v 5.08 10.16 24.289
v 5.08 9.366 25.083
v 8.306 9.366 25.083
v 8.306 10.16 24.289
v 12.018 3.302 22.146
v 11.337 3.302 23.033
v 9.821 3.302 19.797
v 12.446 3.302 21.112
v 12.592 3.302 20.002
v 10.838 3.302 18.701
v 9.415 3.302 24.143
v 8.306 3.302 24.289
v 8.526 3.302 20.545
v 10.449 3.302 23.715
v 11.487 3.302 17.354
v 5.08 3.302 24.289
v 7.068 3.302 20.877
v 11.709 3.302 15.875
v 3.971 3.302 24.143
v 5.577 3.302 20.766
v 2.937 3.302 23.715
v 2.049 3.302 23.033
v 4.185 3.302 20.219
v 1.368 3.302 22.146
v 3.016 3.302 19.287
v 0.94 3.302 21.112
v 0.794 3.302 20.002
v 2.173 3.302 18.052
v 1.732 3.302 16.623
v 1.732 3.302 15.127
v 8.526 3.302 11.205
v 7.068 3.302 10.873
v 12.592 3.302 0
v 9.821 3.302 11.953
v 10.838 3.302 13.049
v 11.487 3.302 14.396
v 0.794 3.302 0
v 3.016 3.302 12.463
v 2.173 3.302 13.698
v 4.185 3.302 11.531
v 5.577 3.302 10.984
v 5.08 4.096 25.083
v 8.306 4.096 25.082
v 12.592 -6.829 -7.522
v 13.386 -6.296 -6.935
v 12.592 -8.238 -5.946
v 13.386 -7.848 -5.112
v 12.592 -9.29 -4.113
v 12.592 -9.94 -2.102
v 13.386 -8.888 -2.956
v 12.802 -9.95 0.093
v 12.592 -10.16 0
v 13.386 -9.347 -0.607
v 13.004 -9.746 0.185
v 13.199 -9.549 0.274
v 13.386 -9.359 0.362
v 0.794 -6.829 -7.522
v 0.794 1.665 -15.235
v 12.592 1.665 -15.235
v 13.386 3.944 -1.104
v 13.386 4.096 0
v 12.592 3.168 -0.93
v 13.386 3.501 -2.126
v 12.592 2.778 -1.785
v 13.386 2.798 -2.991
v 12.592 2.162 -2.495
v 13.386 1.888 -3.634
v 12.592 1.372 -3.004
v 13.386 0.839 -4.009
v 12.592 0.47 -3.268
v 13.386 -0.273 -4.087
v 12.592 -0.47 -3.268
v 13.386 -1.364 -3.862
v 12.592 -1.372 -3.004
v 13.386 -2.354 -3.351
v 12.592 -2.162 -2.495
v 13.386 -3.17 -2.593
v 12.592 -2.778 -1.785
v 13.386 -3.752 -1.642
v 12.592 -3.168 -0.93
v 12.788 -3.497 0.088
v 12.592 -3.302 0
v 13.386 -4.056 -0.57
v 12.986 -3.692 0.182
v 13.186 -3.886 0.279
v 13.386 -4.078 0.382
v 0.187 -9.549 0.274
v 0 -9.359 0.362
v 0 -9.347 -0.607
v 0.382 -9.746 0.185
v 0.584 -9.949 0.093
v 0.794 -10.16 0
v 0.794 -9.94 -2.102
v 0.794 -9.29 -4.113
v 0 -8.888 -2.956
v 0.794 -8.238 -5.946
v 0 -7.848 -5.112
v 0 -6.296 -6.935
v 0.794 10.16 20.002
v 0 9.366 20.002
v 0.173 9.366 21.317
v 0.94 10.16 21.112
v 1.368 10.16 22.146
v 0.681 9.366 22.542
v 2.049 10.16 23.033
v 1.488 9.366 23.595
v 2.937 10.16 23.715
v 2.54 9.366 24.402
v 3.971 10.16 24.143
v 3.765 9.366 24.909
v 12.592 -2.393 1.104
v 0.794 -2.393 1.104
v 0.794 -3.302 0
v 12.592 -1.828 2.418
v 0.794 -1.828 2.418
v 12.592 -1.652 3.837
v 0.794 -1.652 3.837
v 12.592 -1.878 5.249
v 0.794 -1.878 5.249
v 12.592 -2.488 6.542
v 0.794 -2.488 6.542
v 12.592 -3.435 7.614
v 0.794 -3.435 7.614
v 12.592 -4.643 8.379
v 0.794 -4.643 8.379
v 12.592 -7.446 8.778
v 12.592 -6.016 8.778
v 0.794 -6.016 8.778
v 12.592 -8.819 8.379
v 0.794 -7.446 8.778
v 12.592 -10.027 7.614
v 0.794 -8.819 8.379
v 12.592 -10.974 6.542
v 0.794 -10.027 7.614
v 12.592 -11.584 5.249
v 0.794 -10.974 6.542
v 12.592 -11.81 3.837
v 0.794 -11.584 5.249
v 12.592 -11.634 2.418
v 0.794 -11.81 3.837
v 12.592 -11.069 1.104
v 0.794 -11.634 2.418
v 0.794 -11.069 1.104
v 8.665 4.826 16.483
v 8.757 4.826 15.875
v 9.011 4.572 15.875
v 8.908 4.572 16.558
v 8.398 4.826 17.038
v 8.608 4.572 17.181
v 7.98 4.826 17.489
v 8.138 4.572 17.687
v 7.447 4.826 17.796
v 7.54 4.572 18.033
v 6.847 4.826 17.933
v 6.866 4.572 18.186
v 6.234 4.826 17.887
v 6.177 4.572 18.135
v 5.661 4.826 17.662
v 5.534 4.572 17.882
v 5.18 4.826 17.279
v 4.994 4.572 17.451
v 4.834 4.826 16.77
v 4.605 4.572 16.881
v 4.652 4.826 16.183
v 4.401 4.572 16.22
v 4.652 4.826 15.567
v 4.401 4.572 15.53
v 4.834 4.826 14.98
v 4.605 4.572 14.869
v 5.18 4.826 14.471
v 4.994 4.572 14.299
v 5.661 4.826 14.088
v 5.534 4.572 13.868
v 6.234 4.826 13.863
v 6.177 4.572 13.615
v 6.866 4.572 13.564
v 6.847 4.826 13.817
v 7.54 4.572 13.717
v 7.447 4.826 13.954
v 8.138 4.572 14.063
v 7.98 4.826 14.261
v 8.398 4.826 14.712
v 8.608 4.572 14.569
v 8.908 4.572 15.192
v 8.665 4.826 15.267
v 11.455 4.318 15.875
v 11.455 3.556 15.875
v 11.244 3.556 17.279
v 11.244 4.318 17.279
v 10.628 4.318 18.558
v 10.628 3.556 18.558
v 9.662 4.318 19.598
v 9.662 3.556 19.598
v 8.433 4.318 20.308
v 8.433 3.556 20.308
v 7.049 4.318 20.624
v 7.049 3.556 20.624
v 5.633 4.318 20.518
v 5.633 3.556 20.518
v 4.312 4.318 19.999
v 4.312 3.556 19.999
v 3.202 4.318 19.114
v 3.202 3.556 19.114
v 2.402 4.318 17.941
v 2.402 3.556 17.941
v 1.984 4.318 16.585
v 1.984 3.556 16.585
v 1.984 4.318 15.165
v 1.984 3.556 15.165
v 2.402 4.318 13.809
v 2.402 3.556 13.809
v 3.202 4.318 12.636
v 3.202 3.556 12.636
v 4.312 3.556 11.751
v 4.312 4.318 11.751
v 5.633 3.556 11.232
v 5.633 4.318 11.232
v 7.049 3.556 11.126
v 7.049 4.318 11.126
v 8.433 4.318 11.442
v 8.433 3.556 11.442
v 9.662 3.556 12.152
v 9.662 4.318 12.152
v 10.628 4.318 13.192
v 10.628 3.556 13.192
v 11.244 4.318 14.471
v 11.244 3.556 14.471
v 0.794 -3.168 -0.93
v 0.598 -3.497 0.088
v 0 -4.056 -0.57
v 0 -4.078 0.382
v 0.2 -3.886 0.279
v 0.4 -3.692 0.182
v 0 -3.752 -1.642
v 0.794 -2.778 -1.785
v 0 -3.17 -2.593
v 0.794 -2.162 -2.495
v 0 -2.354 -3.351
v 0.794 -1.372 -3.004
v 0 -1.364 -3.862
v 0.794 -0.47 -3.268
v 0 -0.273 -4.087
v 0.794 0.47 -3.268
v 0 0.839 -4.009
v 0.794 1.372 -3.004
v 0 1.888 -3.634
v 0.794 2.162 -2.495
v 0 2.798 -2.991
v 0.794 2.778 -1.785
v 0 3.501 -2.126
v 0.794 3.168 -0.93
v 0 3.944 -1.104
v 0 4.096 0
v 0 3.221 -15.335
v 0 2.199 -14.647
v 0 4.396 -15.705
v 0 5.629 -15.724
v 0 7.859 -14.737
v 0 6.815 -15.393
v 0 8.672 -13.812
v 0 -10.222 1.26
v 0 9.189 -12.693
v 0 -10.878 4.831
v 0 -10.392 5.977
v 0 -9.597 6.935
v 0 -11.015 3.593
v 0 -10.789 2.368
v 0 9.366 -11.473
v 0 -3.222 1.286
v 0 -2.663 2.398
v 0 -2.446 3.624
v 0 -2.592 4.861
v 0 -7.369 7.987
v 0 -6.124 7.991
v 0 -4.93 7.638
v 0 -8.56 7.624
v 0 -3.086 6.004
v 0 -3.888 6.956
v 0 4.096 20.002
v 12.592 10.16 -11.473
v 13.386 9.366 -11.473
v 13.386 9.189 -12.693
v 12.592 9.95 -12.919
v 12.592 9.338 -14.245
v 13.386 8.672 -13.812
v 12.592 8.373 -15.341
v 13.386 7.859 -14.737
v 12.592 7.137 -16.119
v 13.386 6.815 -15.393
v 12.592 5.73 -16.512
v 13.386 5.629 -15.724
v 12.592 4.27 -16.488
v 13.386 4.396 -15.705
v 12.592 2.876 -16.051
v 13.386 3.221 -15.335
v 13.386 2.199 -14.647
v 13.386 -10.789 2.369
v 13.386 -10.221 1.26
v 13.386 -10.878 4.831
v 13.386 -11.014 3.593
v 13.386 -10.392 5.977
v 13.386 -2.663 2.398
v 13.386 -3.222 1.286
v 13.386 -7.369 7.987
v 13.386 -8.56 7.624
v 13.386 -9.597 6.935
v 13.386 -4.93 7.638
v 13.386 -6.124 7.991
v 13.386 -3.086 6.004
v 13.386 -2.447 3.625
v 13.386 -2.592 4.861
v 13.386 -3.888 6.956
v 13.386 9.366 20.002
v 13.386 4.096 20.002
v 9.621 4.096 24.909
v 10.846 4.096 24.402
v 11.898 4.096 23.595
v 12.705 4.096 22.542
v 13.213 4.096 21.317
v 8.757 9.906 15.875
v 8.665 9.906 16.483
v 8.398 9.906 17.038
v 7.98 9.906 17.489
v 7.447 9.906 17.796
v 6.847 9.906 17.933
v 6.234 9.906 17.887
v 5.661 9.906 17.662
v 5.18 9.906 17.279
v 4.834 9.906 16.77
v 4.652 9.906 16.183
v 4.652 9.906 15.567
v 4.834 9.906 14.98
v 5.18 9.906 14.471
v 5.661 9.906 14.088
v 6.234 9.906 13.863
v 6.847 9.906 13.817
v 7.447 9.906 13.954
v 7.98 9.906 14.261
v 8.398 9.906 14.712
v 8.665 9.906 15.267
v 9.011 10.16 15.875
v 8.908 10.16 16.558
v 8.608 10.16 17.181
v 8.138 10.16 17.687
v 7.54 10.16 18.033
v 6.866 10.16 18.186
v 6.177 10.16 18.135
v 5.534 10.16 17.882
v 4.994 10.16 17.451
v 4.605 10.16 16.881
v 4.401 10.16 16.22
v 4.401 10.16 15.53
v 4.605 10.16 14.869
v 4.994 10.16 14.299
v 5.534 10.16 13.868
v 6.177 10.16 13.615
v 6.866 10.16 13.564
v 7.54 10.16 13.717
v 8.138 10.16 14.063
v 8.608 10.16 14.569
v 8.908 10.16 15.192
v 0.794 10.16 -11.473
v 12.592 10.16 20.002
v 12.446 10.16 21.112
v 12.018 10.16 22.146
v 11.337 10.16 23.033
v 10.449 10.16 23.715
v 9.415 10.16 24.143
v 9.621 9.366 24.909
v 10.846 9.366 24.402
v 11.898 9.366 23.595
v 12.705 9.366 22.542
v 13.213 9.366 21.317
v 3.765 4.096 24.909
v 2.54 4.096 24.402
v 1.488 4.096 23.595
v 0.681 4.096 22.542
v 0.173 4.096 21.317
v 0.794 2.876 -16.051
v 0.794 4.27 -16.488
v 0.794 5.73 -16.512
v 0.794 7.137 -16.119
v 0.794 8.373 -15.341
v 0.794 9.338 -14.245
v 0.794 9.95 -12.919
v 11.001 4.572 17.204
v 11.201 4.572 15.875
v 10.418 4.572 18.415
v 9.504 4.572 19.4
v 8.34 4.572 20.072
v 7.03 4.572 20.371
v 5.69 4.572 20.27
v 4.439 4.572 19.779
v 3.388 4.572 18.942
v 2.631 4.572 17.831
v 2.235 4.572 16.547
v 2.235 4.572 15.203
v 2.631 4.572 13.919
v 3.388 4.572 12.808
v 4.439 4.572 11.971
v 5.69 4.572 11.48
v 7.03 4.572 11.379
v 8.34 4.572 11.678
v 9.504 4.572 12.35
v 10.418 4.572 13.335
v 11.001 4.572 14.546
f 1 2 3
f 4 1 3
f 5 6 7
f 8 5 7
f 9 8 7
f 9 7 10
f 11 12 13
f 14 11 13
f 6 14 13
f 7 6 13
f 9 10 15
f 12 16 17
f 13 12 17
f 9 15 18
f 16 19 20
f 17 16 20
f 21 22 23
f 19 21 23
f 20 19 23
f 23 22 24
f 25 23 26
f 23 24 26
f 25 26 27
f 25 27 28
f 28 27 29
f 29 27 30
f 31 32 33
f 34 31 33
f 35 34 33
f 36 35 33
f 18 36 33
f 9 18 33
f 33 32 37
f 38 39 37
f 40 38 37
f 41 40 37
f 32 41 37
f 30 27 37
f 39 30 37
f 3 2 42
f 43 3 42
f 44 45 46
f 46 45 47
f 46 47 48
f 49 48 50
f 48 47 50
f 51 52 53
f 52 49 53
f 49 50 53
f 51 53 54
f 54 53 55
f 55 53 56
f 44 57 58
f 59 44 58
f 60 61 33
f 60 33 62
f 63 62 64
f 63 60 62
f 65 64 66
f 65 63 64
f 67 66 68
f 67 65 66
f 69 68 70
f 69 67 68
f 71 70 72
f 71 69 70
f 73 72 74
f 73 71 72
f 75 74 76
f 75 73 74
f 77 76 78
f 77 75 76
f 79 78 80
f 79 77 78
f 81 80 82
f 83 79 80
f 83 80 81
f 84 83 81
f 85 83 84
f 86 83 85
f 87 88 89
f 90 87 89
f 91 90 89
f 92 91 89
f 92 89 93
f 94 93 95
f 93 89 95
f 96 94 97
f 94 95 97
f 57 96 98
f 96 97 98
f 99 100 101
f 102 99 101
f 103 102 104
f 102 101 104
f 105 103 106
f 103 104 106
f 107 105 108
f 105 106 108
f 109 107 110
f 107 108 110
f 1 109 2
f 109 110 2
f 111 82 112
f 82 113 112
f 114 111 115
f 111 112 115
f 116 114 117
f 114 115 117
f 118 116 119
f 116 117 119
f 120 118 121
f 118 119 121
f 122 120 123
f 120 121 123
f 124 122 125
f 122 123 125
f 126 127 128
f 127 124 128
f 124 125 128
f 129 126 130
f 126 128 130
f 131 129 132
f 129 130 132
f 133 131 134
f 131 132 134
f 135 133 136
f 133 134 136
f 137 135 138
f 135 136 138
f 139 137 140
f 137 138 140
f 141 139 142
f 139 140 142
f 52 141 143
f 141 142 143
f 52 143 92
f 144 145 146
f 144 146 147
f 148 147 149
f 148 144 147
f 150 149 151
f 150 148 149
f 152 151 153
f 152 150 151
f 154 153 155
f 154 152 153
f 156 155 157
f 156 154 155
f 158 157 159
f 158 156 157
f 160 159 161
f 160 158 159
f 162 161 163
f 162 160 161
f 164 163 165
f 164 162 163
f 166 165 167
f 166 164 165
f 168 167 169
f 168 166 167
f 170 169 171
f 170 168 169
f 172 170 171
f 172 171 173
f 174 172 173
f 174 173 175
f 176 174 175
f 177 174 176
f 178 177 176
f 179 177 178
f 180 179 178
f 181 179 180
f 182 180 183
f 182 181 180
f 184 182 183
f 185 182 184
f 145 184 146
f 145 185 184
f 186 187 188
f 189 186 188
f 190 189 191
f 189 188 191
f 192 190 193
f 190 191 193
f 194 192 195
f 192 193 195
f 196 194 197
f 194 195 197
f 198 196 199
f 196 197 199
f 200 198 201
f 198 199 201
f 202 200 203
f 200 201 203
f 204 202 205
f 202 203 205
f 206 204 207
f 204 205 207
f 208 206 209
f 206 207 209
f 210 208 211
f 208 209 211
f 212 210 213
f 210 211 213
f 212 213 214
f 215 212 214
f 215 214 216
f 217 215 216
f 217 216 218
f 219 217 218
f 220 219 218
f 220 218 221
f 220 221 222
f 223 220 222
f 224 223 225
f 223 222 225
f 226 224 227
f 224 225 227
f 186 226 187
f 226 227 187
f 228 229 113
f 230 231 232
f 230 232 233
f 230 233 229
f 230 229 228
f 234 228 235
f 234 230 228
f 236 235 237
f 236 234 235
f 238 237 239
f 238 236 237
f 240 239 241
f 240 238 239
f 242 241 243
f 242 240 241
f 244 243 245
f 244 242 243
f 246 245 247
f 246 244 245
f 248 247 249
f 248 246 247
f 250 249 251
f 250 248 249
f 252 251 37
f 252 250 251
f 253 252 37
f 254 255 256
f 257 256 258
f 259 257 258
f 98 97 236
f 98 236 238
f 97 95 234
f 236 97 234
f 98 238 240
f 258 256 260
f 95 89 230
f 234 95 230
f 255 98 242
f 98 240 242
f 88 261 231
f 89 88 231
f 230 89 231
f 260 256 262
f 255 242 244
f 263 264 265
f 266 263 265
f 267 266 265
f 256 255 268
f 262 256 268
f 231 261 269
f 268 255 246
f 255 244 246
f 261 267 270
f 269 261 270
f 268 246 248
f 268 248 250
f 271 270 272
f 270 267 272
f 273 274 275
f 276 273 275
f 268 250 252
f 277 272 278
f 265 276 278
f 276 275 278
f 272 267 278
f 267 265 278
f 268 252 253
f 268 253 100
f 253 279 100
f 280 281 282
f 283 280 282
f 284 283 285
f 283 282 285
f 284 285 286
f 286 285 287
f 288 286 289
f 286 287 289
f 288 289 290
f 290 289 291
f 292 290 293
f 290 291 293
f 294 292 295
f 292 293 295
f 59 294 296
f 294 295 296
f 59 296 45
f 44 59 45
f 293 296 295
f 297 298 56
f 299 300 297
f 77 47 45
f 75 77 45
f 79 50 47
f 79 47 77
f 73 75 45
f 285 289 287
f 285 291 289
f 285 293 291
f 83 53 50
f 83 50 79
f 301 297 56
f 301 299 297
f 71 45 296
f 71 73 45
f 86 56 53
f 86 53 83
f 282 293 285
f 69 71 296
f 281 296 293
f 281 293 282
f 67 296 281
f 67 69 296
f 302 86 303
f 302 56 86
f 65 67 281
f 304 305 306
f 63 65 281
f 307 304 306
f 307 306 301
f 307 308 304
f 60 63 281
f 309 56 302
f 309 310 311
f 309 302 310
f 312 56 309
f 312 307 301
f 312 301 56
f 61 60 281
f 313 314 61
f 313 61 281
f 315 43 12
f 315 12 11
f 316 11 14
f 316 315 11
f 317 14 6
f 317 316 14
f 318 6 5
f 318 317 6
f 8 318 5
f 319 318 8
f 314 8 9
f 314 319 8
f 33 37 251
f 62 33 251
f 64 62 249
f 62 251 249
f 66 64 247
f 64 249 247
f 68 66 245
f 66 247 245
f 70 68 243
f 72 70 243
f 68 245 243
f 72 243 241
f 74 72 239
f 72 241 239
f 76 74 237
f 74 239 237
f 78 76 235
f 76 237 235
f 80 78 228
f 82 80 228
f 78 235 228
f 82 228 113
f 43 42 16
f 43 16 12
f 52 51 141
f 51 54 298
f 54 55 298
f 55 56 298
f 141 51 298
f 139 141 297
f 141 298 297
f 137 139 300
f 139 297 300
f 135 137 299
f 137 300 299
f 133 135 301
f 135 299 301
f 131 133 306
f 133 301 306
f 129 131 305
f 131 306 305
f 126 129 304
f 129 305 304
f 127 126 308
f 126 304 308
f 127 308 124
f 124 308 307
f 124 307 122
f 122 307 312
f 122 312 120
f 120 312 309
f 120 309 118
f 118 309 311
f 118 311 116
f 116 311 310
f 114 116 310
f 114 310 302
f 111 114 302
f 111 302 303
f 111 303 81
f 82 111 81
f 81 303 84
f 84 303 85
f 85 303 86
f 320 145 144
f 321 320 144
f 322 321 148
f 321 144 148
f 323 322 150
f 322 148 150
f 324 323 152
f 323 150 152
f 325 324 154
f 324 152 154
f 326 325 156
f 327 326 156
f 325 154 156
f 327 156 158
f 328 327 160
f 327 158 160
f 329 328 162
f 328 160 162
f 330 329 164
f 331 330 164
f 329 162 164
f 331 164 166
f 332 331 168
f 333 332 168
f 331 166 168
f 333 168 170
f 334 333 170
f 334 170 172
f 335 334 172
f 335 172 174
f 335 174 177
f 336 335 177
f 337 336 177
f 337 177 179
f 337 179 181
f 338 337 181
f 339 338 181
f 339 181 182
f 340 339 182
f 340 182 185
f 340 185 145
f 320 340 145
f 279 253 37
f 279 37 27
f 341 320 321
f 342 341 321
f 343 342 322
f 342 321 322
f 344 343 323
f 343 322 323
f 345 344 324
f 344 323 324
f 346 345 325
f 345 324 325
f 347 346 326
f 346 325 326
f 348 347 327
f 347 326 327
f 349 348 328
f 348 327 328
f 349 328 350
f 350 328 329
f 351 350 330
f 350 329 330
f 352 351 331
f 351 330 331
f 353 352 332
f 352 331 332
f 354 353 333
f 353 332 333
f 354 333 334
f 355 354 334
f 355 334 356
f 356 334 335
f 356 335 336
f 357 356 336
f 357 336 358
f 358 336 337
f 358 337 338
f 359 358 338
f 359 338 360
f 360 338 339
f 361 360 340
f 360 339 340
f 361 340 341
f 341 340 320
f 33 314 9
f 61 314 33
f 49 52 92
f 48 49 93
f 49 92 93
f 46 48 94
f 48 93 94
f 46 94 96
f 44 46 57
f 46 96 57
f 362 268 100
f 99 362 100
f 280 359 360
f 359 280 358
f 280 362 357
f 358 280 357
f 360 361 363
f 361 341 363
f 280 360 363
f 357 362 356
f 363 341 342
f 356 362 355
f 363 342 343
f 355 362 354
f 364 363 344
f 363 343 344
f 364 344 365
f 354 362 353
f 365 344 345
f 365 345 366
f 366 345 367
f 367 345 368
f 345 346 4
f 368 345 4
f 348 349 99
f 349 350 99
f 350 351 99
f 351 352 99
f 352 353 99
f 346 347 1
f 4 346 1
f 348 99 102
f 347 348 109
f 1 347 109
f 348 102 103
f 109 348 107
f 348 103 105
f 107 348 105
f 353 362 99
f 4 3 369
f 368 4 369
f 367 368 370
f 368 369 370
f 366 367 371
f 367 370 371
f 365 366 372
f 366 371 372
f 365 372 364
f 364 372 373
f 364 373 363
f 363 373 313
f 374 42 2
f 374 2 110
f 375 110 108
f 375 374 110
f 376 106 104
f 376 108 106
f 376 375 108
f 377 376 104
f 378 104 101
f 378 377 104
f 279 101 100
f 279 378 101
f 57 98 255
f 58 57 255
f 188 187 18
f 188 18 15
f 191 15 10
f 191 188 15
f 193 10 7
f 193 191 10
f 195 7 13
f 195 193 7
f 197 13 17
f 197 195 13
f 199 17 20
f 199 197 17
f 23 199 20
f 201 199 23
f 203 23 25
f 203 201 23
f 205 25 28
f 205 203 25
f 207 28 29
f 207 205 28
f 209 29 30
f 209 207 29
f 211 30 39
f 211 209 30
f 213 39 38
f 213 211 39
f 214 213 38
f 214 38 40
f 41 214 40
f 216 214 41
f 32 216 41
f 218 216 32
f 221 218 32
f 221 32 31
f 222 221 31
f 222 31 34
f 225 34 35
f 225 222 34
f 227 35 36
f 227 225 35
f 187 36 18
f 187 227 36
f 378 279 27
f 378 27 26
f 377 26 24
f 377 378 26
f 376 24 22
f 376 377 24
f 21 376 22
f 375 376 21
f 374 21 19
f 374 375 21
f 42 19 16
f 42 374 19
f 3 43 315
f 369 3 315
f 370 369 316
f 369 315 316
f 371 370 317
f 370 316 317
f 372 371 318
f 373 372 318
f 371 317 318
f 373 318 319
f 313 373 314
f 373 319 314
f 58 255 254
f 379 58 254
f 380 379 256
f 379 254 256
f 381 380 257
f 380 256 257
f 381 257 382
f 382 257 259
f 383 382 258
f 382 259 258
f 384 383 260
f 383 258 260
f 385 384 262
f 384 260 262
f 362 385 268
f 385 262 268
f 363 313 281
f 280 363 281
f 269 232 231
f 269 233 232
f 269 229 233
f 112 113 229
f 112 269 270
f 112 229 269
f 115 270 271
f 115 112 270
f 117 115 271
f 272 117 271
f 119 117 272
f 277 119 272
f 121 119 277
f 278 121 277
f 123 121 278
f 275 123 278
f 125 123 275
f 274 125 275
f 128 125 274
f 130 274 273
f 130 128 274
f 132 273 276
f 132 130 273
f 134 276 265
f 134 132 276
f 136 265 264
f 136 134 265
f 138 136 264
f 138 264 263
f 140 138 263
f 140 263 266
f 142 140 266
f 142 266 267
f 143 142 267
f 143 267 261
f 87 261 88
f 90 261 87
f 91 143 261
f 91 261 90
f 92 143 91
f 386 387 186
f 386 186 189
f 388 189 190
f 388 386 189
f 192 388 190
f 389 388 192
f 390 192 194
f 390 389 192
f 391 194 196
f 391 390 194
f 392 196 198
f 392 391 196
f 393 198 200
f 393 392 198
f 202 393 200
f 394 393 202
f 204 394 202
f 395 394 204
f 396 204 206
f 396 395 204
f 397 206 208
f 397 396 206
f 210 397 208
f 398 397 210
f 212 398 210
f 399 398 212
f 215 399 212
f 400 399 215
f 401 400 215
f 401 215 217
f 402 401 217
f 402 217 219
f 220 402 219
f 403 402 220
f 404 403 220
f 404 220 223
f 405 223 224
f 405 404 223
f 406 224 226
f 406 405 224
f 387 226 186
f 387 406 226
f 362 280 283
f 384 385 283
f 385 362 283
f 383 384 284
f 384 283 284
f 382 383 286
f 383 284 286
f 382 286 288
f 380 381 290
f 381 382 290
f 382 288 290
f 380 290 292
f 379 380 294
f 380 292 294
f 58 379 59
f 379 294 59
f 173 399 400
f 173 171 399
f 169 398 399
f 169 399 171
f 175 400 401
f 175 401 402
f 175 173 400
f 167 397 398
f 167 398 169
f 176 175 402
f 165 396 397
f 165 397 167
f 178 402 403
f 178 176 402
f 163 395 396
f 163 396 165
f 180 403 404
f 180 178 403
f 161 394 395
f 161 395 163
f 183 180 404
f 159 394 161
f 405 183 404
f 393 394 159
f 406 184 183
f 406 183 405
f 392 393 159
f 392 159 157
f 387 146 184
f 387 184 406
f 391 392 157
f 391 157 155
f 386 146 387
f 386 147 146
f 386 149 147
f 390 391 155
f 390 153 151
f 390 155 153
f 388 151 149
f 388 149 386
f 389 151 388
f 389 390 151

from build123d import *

# Parameters (mm, degrees)
F1_DEPTH   = 13.3858
F2_R       = 5.08
F3_R       = 2.06375
F4_DEPTH   = 25.4
F5_R       = 4.7625
F6_DEPTH   = 1.27
F7_C1_SIZE = 0.79375
F7_C2_SIZE = 0.79375
F7_C3_SIZE = 0.79365
F7_C4_SIZE = 0.79375
F8_SIZE    = 0.254


# Not quite as in the source:
# - a fillet or chamfer is up to 0.001 mm smaller than in the source, because OpenCascade refuses the exact size


with BuildPart() as f1:
    # F0 (on Right) → F1 (new body)
    with BuildSketch(Plane.YZ):
        with BuildLine():
            Line((10.16, -22.9468941689), (10.16, 25.0825))
            Line((10.16, 25.0825), (3.302, 25.0825))
            Line((3.302, 25.0825), (3.302, 0))
            ThreePointArc((3.302, 0), (0, -3.302), (-3.302, 0))
            ThreePointArc((-3.302, 0), (-6.731, 8.8281140591), (-10.16, 0))
            ThreePointArc((-10.16, 0), (-9.2901189355, -4.1133064758), (-6.8294310701, -7.5222650352))
            Line((-6.8294310701, -7.5222650352), (10.16, -22.9468941689))
        make_face()
    extrude(amount=F1_DEPTH)

    # F2
    f2_edges = [f1.edges().sort_by_distance(p)[0] for p in [
        (6.6929, 10.16, -22.946894),
        (13.3858, 6.731, 25.0825),
        (0, 6.731, 25.0825),
    ]]
    fillet(f2_edges, radius=F2_R)

    # F3 (on face) → F4 (cut)
    with BuildSketch(Plane.XZ.offset(-3.302)):
        with Locations((6.6929, 15.875)):
            Circle(F3_R)
    extrude(amount=-F4_DEPTH, mode=Mode.SUBTRACT)

    # F5 (on face) → F6 (cut)
    with BuildSketch(Plane.XZ.offset(-3.302)):
        with Locations((6.6929, 15.875)):
            Circle(F5_R)
    extrude(amount=-F6_DEPTH, mode=Mode.SUBTRACT)

    # F7: chamfer of 0.79375 on 16 edges, made by hand

    # F7_c1
    f7_c1_edges = [f1.edges().sort_by_distance(p)[0] for p in [
        (6.6929, 10.16, 25.0825),
        (1.4878975516, 10.16, 23.5946024484),
        (11.8979024484, 10.16, 23.5946024484),
        (0, 10.16, 4.2645264578),
        (13.3858, 10.16, 4.2645264578),
        (0, 7.1366532379, -16.1185065522),
        (0, -2.5820733026, -11.3784223186),
        (0, -9.2901189355, -4.1133064758),
        (13.3858, 7.1366532379, -16.1185065522),
        (13.3858, -2.5820733026, -11.3784223186),
        (13.3858, -9.2901189355, -4.1133064758),
    ]]
    chamfer(f7_c1_edges, length=F7_C1_SIZE)

    # F7_c2
    f7_c2_edges = [f1.edges().sort_by_distance(p)[0] for p in [
        (6.6929, 3.302, 25.0825),
        (1.4878975516, 3.302, 23.5946024484),
        (11.8979024484, 3.302, 23.5946024484),
        (0, 3.302, 10.00125),
        (0, 0, -3.302),
        (13.3858, 3.302, 10.00125),
        (13.3858, 0, -3.302),
    ]]
    chamfer(f7_c2_edges, length=F7_C2_SIZE)

    # F7_c3 (size 0.79375 in the source; OpenCascade refuses exactly that, so slightly less here)
    f7_c3_edges = [f1.edges().sort_by_distance(p)[0] for p in [
        (0, -6.731, 8.8281140591),
    ]]
    chamfer(f7_c3_edges, length=F7_C3_SIZE)

    # F7_c4
    f7_c4_edges = [f1.edges().sort_by_distance(p)[0] for p in [
        (13.3858, -6.731, 8.8281140591),
    ]]
    chamfer(f7_c4_edges, length=F7_C4_SIZE)

    # F8
    f8_edges = [f1.edges().sort_by_distance(p)[0] for p in [
        (11.4554, 3.937, 15.875),
        (1.9304, 3.302, 15.875),
        (1.9304, 4.572, 15.875),
        (4.62915, 4.572, 15.875),
        (8.75665, 7.366, 15.875),
        (4.62915, 10.16, 15.875),
    ]]
    chamfer(f8_edges, length=F8_SIZE)


solid = f1.part
